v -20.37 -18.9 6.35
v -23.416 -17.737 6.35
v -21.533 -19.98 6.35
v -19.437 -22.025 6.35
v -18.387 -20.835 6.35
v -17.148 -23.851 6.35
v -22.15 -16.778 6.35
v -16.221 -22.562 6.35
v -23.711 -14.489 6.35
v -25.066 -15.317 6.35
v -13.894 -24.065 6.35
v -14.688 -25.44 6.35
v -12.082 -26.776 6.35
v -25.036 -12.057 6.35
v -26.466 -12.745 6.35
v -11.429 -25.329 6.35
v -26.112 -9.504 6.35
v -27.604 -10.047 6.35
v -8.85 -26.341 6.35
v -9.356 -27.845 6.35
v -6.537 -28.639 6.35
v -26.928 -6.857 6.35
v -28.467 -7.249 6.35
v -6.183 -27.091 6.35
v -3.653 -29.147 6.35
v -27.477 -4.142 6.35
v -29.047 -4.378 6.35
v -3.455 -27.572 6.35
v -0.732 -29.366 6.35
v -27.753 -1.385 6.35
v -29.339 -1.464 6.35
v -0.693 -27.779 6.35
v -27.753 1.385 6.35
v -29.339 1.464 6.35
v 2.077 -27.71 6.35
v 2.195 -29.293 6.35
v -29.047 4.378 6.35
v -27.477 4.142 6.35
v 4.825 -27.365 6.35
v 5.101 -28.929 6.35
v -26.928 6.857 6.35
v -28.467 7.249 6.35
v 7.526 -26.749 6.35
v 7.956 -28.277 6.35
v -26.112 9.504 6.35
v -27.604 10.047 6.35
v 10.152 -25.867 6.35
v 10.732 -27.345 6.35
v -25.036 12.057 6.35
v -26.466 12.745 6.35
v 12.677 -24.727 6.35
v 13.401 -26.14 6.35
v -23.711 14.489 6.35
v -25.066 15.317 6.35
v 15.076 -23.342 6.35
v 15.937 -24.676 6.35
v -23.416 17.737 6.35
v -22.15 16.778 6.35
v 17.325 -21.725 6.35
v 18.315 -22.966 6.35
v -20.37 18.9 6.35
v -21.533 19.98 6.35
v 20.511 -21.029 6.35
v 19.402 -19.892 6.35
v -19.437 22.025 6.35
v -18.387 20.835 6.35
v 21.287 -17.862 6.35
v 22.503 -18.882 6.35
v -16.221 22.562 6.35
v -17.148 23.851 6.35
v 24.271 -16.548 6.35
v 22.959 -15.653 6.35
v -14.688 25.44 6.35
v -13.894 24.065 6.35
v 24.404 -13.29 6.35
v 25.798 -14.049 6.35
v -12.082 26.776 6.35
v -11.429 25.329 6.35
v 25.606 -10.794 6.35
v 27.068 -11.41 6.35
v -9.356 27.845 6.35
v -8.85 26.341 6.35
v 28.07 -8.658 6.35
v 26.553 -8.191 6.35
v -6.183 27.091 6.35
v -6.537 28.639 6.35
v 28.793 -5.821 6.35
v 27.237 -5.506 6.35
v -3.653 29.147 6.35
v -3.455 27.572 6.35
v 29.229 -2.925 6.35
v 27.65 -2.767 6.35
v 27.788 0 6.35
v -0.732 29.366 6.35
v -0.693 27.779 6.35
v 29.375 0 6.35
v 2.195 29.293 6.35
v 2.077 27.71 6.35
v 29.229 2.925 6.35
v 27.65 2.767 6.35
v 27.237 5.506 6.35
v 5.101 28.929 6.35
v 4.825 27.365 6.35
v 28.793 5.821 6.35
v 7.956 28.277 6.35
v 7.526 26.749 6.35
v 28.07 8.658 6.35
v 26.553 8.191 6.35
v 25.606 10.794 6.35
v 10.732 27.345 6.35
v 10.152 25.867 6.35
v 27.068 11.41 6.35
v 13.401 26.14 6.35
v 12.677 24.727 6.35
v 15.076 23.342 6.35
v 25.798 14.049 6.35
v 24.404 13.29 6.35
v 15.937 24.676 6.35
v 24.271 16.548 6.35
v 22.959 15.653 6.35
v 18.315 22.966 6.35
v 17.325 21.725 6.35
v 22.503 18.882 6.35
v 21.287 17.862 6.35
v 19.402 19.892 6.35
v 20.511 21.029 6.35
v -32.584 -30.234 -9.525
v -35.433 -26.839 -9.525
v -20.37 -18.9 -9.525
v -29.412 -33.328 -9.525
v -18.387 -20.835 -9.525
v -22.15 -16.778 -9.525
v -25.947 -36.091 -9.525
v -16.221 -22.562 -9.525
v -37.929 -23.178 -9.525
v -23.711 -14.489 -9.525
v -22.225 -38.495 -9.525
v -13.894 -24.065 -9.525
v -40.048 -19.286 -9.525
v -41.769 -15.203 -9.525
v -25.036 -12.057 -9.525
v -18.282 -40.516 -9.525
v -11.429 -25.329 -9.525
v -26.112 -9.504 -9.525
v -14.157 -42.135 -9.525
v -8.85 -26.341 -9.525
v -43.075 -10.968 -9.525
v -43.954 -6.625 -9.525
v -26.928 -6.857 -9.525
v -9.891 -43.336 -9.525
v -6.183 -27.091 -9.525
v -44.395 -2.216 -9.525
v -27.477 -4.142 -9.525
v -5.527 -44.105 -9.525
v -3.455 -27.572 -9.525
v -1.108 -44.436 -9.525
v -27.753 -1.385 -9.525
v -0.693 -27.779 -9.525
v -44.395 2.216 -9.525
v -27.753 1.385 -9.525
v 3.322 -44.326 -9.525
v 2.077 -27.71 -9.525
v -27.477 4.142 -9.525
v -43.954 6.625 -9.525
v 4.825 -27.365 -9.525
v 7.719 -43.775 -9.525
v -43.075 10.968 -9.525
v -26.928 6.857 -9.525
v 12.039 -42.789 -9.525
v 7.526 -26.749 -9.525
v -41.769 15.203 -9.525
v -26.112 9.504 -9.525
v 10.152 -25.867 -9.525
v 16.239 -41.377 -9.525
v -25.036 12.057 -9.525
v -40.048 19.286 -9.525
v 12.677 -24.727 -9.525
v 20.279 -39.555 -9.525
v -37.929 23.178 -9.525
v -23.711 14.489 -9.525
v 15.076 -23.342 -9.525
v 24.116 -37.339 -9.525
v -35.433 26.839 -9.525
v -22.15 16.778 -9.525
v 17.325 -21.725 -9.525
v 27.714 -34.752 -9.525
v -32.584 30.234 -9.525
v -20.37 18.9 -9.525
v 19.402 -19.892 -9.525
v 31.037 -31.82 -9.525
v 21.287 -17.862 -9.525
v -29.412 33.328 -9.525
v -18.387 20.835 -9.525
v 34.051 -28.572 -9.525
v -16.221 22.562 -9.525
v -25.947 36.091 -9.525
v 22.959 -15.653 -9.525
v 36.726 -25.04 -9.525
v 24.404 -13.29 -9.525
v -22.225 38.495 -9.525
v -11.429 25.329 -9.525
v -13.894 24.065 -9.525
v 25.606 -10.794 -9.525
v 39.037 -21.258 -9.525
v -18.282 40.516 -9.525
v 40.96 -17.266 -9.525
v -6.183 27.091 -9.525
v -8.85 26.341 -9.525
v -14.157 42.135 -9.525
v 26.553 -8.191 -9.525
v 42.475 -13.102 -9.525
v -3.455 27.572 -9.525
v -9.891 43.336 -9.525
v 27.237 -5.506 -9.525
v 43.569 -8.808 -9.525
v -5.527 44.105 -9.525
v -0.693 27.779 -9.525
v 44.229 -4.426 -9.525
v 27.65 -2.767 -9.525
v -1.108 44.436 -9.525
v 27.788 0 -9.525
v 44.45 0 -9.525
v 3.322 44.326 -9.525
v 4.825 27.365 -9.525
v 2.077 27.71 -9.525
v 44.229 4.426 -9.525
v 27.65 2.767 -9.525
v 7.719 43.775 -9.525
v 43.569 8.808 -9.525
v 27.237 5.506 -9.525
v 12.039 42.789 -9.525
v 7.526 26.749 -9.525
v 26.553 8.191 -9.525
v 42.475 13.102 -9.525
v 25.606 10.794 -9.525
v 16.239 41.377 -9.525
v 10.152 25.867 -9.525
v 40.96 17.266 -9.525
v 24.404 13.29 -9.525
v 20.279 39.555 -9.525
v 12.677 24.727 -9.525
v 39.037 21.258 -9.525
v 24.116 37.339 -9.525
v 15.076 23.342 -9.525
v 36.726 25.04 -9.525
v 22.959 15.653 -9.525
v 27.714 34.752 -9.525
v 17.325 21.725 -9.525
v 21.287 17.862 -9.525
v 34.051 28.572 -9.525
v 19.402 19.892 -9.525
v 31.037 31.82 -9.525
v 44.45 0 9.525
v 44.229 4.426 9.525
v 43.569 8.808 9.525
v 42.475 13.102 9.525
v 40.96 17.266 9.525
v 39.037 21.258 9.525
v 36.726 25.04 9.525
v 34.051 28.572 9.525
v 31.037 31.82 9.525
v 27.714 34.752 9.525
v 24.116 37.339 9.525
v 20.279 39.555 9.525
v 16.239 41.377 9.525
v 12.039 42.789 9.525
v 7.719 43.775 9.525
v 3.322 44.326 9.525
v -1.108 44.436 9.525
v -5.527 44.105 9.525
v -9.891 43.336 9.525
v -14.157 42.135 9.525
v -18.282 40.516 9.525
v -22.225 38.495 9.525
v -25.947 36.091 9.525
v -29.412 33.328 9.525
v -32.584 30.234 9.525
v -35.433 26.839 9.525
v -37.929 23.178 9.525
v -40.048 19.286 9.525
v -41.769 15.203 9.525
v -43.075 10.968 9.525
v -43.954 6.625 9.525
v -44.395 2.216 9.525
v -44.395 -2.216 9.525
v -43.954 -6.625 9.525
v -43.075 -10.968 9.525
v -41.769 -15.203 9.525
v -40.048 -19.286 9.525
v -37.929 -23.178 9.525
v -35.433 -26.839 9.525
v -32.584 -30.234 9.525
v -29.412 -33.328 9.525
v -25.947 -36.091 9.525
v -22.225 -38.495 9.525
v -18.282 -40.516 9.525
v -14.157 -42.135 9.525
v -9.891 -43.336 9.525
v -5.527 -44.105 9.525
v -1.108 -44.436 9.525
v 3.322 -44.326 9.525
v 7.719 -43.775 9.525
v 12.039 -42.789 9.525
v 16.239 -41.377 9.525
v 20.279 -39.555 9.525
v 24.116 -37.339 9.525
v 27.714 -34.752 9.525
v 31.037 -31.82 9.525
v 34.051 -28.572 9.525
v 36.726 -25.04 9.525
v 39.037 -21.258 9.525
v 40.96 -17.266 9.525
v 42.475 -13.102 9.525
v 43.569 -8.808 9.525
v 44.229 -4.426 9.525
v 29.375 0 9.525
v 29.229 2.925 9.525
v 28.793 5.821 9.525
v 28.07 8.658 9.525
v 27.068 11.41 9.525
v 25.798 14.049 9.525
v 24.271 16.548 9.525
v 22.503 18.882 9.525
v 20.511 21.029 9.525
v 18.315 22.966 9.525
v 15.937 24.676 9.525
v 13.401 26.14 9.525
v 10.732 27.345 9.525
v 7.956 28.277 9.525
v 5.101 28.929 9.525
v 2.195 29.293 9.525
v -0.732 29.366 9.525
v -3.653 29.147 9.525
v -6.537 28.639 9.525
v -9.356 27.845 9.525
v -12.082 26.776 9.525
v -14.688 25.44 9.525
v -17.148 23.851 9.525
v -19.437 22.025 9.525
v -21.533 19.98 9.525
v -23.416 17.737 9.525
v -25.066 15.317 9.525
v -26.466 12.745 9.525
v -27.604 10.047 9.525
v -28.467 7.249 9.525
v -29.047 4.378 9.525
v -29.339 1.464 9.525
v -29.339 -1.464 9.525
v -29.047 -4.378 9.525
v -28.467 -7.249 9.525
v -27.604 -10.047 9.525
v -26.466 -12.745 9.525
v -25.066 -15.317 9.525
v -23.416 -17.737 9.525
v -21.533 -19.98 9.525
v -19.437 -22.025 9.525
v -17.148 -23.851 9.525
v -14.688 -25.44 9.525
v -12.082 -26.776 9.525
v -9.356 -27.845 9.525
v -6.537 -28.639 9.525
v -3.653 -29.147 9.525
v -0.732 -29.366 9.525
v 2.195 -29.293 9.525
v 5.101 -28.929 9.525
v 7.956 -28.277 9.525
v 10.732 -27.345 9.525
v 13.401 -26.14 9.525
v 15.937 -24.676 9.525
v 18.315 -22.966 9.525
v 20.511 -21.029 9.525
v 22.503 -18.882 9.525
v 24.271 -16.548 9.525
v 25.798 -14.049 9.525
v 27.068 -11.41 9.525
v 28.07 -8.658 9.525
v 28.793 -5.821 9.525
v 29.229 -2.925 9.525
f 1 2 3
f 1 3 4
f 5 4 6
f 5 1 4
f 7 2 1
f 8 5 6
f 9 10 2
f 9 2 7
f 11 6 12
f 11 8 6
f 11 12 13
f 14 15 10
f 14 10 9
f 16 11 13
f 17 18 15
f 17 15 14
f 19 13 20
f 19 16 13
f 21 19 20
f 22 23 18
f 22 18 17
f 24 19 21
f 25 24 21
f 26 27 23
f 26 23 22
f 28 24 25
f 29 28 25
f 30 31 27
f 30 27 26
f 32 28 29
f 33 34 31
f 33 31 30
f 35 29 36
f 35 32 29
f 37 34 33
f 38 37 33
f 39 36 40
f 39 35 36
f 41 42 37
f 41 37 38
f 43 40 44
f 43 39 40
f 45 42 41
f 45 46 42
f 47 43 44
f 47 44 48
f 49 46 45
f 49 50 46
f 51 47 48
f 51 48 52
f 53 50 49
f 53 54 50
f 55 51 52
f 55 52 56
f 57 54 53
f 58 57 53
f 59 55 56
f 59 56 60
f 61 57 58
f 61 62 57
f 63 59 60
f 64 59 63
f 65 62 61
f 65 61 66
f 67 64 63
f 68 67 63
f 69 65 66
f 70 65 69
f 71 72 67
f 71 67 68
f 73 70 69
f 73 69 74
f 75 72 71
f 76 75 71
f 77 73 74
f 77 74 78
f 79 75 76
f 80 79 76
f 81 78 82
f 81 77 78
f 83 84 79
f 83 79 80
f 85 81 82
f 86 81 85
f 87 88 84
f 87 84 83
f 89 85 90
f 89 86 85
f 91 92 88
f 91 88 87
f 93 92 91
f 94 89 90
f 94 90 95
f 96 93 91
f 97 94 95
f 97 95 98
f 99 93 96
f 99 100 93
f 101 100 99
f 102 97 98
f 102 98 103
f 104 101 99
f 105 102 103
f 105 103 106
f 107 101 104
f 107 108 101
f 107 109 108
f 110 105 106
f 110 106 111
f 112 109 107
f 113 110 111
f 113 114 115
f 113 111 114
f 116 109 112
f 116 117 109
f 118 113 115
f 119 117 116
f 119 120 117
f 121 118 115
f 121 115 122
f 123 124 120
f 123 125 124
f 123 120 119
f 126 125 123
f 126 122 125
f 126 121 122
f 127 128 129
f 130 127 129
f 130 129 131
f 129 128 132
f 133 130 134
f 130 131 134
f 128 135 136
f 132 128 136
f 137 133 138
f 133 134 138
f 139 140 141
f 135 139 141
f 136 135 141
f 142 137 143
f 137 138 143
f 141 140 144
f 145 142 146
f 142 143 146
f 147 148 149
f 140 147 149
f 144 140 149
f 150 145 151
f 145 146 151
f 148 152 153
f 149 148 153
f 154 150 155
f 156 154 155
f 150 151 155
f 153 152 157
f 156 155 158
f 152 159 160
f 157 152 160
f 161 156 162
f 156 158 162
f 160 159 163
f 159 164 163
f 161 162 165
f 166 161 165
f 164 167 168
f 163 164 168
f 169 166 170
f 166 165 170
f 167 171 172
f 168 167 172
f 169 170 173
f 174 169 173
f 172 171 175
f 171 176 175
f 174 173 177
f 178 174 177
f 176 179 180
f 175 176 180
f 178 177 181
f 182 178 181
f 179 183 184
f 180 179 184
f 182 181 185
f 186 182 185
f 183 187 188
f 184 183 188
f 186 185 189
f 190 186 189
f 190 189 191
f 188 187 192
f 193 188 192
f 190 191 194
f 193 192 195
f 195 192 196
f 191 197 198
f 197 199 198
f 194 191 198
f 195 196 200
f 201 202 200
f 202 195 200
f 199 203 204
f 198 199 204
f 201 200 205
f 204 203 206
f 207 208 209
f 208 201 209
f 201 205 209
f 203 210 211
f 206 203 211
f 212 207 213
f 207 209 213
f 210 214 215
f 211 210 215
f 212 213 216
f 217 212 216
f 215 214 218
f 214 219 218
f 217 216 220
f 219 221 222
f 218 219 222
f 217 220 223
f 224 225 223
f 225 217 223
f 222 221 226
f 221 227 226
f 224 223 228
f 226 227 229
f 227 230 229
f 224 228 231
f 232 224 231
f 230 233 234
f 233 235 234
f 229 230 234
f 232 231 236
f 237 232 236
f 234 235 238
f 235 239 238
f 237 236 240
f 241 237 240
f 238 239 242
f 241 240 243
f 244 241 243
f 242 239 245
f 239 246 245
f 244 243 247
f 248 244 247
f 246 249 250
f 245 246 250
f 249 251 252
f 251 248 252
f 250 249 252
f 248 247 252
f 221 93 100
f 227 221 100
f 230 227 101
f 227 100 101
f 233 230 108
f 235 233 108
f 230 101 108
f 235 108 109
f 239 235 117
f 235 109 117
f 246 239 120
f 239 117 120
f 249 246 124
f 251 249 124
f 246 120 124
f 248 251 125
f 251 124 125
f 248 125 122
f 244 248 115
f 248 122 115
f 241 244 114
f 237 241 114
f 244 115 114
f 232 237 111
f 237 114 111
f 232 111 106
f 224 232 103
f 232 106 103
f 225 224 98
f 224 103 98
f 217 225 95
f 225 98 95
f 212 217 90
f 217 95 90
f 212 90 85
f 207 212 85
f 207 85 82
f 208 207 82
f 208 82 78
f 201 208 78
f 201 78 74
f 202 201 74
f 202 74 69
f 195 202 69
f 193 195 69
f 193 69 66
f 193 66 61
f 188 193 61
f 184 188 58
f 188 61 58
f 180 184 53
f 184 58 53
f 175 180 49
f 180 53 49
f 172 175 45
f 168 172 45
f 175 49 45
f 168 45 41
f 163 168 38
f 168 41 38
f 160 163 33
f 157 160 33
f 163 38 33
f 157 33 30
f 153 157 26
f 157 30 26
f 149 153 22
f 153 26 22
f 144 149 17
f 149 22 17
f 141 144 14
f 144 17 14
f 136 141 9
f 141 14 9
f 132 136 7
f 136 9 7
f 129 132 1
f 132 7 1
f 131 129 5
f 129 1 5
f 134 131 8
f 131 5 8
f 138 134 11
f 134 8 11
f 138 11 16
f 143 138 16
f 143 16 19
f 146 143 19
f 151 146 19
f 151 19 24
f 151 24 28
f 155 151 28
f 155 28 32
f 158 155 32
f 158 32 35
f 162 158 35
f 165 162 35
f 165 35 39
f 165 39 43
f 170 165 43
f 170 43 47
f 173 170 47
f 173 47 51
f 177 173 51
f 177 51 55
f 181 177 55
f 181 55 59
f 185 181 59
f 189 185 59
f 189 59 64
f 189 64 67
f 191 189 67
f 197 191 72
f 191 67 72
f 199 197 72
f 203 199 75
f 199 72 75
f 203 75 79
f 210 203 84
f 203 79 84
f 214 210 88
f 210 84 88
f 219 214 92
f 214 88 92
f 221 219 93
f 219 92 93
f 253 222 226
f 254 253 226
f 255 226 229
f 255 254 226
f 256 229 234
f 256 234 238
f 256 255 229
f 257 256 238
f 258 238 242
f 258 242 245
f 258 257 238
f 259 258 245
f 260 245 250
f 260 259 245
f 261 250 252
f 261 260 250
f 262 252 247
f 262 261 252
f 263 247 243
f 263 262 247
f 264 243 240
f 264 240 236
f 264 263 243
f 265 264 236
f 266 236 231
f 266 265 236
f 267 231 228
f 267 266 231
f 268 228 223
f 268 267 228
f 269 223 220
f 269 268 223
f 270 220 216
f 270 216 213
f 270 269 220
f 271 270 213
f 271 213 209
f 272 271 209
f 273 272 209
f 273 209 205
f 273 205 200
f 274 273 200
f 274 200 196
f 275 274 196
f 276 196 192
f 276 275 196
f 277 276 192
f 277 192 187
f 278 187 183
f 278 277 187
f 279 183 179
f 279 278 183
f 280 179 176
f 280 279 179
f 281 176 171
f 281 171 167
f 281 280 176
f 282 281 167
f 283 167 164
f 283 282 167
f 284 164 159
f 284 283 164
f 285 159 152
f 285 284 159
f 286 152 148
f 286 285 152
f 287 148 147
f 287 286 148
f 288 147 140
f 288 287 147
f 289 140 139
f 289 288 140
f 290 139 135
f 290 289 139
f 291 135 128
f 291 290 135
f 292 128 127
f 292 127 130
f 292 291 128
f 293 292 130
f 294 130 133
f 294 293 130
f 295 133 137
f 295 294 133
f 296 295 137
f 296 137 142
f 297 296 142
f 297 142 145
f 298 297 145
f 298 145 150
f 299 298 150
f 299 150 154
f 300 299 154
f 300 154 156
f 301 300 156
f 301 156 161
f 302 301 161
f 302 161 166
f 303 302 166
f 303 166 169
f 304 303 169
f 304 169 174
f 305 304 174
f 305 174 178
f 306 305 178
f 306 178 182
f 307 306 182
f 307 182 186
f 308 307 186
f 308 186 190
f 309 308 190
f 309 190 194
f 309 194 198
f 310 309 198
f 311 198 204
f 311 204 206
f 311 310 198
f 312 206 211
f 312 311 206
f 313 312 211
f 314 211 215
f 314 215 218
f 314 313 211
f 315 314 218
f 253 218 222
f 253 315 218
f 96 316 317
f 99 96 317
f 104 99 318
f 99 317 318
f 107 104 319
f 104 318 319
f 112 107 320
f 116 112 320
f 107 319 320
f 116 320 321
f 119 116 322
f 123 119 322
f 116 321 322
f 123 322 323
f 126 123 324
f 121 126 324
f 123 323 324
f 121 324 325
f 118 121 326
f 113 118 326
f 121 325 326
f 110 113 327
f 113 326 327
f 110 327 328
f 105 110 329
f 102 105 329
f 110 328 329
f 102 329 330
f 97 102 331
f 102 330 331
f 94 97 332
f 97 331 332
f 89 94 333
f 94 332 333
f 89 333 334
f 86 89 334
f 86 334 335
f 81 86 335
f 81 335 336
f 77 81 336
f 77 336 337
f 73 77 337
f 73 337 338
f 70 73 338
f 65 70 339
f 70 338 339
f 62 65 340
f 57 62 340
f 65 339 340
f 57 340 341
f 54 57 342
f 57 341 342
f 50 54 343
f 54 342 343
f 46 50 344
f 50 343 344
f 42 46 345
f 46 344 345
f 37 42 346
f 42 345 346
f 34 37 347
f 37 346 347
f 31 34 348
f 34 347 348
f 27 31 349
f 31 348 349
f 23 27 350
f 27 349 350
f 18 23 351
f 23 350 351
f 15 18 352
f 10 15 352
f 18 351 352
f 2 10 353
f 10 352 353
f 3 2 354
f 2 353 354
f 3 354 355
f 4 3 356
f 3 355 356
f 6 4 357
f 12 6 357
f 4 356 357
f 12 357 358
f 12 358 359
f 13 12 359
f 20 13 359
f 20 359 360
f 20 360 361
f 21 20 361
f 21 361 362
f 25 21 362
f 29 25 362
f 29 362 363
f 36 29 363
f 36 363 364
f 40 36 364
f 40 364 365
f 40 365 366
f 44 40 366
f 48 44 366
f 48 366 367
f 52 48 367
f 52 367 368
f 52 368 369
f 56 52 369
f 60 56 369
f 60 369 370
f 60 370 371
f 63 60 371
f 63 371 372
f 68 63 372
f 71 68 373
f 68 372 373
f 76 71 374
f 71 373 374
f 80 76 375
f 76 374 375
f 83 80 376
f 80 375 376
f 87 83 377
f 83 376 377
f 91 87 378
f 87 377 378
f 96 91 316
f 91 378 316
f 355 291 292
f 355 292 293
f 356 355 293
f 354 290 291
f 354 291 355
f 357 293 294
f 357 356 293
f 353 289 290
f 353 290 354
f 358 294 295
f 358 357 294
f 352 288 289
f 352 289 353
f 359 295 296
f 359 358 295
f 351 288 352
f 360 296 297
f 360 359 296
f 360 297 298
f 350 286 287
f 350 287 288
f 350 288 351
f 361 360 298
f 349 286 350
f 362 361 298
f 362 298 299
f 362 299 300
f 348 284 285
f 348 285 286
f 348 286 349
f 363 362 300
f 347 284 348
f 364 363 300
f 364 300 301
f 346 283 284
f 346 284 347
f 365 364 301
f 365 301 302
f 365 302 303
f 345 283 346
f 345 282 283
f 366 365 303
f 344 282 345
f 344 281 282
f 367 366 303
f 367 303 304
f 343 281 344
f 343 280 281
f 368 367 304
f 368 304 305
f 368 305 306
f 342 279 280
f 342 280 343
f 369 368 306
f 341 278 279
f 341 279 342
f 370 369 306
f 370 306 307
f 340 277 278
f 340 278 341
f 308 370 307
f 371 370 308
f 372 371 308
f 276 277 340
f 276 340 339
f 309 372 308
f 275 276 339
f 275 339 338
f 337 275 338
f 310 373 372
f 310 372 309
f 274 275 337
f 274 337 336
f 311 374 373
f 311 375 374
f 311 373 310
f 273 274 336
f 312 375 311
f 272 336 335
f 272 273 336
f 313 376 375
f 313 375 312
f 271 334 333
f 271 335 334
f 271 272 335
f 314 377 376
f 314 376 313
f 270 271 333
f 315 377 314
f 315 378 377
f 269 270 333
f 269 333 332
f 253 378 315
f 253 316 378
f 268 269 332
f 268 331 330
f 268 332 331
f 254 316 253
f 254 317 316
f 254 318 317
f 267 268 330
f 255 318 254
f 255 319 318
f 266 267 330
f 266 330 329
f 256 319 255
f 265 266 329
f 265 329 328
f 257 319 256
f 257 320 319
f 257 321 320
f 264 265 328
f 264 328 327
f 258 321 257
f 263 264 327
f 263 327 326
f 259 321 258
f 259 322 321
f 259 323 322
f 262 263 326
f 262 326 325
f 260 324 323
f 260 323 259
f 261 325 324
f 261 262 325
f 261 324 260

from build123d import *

# Parameters (mm, degrees)
F0_R     = 44.45
F1_DEPTH = 9.525
F2_R     = 29.3751
F3_DEPTH = 3.175
F4_R     = 27.7876
F5_DEPTH = 15.875


with BuildPart() as f1:
    # F0 (on Top) → F1 (new body, symmetric)
    with BuildSketch(Plane.XY):
        Circle(F0_R)
    extrude(amount=F1_DEPTH, both=True)

    # F2 (on face) → F3 (cut)
    with BuildSketch(Plane.XY.offset(9.525)):
        Circle(F2_R)
    extrude(amount=-F3_DEPTH, mode=Mode.SUBTRACT)

    # F4 (on face) → F5 (cut)
    with BuildSketch(Plane.XY.offset(6.35)):
        Circle(F4_R)
    extrude(amount=-F5_DEPTH, mode=Mode.SUBTRACT)


solid = f1.part
